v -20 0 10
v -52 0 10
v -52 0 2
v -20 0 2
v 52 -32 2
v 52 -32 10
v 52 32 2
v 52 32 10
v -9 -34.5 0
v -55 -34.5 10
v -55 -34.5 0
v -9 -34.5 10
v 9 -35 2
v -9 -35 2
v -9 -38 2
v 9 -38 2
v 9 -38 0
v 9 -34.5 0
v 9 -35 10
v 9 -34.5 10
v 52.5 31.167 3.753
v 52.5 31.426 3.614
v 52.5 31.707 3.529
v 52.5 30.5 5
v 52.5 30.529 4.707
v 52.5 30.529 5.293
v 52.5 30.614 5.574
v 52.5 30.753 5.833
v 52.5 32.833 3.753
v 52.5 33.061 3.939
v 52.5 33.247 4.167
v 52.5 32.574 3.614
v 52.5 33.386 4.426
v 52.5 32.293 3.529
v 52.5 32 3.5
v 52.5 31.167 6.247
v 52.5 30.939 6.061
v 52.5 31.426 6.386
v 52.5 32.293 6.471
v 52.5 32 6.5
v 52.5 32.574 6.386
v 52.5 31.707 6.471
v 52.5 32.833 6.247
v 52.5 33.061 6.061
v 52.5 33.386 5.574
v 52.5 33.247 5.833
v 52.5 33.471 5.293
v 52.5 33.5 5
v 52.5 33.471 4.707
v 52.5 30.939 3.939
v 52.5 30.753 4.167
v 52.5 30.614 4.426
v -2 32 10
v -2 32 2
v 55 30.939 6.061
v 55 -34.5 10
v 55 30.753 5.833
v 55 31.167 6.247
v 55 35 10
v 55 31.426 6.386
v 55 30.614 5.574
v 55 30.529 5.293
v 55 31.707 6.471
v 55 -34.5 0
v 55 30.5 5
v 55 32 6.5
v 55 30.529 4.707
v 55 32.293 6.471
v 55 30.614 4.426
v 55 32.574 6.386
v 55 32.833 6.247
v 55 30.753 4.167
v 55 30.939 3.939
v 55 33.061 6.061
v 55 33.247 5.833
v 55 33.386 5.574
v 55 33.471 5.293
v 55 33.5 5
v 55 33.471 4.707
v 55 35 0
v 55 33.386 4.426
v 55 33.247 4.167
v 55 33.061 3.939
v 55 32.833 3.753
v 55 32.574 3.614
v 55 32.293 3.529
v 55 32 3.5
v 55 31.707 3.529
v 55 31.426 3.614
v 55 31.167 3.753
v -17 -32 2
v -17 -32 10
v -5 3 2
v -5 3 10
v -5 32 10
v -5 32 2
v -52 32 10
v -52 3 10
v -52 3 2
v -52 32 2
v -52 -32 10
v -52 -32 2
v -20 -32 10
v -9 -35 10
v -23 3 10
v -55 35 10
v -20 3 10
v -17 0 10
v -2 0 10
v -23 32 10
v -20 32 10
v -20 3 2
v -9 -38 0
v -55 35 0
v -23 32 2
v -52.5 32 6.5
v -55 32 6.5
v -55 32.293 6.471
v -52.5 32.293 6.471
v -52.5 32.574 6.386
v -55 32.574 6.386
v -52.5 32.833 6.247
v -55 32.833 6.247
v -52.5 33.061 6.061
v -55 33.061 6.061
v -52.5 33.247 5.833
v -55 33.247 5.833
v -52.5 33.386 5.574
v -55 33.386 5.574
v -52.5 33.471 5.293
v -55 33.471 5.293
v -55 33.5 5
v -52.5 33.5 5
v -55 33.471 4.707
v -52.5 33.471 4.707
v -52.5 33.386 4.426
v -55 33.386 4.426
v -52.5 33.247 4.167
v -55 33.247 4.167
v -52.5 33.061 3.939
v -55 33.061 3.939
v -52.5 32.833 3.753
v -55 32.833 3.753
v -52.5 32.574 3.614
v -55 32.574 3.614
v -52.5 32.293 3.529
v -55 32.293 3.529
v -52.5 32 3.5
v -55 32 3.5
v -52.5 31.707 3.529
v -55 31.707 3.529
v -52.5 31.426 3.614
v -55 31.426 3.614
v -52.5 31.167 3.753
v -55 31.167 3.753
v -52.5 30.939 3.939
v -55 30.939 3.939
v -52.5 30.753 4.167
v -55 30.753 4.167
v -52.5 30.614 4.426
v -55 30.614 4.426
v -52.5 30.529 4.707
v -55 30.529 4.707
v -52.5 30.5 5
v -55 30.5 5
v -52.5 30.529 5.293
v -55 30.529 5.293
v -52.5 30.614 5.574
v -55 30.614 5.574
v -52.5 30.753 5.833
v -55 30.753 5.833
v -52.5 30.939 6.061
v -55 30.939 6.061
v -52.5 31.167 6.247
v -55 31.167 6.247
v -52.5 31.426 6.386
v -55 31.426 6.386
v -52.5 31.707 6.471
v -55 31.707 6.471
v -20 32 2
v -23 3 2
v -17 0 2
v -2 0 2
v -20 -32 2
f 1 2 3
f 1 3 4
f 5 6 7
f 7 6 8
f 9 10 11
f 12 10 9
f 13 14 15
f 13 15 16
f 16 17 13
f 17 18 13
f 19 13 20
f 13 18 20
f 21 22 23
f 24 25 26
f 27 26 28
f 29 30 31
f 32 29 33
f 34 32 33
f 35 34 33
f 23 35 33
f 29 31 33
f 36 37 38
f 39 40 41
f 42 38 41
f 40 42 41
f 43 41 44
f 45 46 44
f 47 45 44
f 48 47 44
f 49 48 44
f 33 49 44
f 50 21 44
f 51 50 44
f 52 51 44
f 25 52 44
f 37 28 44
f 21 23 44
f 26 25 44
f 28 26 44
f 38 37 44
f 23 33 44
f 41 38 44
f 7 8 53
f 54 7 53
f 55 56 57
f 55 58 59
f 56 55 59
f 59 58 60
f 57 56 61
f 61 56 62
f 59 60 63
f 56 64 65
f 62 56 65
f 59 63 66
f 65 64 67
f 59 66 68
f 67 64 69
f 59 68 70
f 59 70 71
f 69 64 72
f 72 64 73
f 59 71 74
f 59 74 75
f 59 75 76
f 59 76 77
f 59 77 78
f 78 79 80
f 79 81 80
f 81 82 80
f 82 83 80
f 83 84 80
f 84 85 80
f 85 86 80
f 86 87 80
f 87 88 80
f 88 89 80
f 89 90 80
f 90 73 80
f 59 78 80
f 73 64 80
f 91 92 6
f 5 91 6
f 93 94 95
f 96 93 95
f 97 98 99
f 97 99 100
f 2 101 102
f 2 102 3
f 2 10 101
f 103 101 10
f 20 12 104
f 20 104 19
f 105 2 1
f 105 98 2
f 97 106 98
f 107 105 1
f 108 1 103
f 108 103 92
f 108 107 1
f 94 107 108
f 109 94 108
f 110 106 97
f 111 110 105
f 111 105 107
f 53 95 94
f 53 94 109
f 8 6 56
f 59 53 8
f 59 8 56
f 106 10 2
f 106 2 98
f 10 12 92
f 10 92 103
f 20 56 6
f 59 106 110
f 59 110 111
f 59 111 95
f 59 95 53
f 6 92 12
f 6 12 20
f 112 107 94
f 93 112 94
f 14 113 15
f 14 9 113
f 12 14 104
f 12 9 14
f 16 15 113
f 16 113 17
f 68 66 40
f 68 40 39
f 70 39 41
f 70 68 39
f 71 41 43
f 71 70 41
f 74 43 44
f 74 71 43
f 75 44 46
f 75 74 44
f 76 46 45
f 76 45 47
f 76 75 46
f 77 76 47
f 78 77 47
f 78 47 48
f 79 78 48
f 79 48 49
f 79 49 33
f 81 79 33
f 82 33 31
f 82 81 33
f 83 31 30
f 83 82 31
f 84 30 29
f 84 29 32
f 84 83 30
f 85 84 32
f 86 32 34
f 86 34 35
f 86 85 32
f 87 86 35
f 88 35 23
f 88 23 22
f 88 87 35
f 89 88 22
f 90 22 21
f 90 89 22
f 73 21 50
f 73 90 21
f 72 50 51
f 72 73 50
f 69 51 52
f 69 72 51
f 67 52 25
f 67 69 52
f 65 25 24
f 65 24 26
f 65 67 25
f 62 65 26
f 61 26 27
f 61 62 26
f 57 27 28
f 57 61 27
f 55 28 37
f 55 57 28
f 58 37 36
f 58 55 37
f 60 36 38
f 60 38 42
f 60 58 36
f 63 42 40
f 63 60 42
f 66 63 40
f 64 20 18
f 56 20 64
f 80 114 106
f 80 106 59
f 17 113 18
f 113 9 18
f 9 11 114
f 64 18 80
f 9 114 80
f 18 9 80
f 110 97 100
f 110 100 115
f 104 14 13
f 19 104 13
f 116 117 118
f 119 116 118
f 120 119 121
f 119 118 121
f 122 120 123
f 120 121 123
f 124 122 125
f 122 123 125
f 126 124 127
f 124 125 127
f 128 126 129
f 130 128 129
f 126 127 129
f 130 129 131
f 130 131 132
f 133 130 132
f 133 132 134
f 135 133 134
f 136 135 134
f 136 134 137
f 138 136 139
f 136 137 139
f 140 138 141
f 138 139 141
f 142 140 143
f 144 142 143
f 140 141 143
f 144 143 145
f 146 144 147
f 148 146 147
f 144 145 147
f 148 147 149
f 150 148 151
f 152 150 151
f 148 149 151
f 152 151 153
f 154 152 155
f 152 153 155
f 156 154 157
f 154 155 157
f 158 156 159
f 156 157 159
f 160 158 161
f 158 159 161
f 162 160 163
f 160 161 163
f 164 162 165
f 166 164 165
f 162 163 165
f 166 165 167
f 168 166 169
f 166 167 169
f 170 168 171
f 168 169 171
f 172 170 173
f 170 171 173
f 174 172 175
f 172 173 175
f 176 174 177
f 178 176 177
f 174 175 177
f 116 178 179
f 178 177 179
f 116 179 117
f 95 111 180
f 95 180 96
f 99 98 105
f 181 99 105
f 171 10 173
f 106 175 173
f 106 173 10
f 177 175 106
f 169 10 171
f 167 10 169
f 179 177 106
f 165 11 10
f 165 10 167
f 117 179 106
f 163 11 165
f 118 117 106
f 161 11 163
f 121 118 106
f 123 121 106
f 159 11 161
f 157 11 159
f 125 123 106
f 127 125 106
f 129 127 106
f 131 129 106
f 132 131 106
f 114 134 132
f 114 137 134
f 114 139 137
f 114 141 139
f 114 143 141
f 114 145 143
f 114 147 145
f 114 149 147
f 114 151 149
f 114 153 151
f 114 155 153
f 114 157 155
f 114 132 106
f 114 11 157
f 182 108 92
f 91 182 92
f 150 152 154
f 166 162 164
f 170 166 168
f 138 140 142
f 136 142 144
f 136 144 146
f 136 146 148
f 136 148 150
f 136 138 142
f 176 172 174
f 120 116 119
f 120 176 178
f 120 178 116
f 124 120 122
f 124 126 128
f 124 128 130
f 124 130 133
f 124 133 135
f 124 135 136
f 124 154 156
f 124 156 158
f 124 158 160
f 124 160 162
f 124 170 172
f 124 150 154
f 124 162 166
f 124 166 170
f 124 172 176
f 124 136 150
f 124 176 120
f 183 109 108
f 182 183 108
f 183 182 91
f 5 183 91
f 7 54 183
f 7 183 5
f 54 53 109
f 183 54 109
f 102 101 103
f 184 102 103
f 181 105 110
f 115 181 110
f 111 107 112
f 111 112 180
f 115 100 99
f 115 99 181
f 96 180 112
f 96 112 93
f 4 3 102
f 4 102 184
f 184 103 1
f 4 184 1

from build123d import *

# Parameters (mm, degrees)
SKETCH1_W           = 110
SKETCH1_H           = 70
BOSS_EXTRUDE1_DEPTH = 10
SKETCH2_W           = 29
SKETCH2_H           = 29
SKETCH2_W_2         = 32
SKETCH2_H_2         = 32
SKETCH2_W_3         = 15
CUT_EXTRUDE1_DEPTH  = 8
CUT_EXTRUDE3_DEPTH  = 8
SKETCH4_R           = 1.5
CUT_EXTRUDE4_DEPTH  = 2.5
SKETCH5_W           = 46
SKETCH5_H           = 0.5
CUT_EXTRUDE5_DEPTH  = 11
SKETCH7_W           = 18
SKETCH7_H           = 2
BOSS_EXTRUDE2_DEPTH = 3


with BuildPart() as part:
    # Sketch1 → Boss-Extrude1 (new body)
    with BuildSketch(Plane.XY):
        Rectangle(SKETCH1_W, SKETCH1_H)
    extrude(amount=BOSS_EXTRUDE1_DEPTH)

    # Sketch2 → Cut-Extrude1 (cut)
    with BuildSketch(Plane.XY.offset(10)):
        with Locations((-37.5, 17.5)):
            Rectangle(SKETCH2_W, SKETCH2_H)
        with Locations((-36, -16)):
            Rectangle(SKETCH2_W_2, SKETCH2_H_2)
        with Locations((-12.5, 17.5)):
            Rectangle(SKETCH2_W_3, SKETCH2_H)
    extrude(amount=-CUT_EXTRUDE1_DEPTH, mode=Mode.SUBTRACT)

    # Sketch3 → Cut-Extrude3 (cut)
    with BuildSketch(Plane.XY.offset(10)):
        Polygon((-17, 0), (-17, -32), (52, -32), (52, 32), (-2, 32), (-2, 0), align=None)
    extrude(amount=-CUT_EXTRUDE3_DEPTH, mode=Mode.SUBTRACT)

    # Sketch4 → Cut-Extrude4 (cut)
    with BuildSketch(Plane.ZY.offset(55)):
        with Locations((5, 32)):
            Circle(SKETCH4_R)
    cut_extrude4 = extrude(amount=-CUT_EXTRUDE4_DEPTH, mode=Mode.SUBTRACT)

    # Mirror1: Cut-Extrude4 across plane
    add(cut_extrude4.mirror(Plane.ZY), mode=Mode.SUBTRACT)

    # Sketch5 → Cut-Extrude5 (cut, through all)
    with BuildSketch(Plane.XY.offset(10)):
        with Locations((-32, -34.75)):
            Rectangle(SKETCH5_W, SKETCH5_H)
        with Locations((32, -34.75)):
            Rectangle(SKETCH5_W, SKETCH5_H)
    extrude(amount=-CUT_EXTRUDE5_DEPTH, mode=Mode.SUBTRACT)

    # Sketch7 → Boss-Extrude2 (add)
    with BuildSketch(Plane.XZ.offset(35)):
        with Locations((0, 1)):
            Rectangle(SKETCH7_W, SKETCH7_H)
    extrude(amount=BOSS_EXTRUDE2_DEPTH)


solid = part.part
